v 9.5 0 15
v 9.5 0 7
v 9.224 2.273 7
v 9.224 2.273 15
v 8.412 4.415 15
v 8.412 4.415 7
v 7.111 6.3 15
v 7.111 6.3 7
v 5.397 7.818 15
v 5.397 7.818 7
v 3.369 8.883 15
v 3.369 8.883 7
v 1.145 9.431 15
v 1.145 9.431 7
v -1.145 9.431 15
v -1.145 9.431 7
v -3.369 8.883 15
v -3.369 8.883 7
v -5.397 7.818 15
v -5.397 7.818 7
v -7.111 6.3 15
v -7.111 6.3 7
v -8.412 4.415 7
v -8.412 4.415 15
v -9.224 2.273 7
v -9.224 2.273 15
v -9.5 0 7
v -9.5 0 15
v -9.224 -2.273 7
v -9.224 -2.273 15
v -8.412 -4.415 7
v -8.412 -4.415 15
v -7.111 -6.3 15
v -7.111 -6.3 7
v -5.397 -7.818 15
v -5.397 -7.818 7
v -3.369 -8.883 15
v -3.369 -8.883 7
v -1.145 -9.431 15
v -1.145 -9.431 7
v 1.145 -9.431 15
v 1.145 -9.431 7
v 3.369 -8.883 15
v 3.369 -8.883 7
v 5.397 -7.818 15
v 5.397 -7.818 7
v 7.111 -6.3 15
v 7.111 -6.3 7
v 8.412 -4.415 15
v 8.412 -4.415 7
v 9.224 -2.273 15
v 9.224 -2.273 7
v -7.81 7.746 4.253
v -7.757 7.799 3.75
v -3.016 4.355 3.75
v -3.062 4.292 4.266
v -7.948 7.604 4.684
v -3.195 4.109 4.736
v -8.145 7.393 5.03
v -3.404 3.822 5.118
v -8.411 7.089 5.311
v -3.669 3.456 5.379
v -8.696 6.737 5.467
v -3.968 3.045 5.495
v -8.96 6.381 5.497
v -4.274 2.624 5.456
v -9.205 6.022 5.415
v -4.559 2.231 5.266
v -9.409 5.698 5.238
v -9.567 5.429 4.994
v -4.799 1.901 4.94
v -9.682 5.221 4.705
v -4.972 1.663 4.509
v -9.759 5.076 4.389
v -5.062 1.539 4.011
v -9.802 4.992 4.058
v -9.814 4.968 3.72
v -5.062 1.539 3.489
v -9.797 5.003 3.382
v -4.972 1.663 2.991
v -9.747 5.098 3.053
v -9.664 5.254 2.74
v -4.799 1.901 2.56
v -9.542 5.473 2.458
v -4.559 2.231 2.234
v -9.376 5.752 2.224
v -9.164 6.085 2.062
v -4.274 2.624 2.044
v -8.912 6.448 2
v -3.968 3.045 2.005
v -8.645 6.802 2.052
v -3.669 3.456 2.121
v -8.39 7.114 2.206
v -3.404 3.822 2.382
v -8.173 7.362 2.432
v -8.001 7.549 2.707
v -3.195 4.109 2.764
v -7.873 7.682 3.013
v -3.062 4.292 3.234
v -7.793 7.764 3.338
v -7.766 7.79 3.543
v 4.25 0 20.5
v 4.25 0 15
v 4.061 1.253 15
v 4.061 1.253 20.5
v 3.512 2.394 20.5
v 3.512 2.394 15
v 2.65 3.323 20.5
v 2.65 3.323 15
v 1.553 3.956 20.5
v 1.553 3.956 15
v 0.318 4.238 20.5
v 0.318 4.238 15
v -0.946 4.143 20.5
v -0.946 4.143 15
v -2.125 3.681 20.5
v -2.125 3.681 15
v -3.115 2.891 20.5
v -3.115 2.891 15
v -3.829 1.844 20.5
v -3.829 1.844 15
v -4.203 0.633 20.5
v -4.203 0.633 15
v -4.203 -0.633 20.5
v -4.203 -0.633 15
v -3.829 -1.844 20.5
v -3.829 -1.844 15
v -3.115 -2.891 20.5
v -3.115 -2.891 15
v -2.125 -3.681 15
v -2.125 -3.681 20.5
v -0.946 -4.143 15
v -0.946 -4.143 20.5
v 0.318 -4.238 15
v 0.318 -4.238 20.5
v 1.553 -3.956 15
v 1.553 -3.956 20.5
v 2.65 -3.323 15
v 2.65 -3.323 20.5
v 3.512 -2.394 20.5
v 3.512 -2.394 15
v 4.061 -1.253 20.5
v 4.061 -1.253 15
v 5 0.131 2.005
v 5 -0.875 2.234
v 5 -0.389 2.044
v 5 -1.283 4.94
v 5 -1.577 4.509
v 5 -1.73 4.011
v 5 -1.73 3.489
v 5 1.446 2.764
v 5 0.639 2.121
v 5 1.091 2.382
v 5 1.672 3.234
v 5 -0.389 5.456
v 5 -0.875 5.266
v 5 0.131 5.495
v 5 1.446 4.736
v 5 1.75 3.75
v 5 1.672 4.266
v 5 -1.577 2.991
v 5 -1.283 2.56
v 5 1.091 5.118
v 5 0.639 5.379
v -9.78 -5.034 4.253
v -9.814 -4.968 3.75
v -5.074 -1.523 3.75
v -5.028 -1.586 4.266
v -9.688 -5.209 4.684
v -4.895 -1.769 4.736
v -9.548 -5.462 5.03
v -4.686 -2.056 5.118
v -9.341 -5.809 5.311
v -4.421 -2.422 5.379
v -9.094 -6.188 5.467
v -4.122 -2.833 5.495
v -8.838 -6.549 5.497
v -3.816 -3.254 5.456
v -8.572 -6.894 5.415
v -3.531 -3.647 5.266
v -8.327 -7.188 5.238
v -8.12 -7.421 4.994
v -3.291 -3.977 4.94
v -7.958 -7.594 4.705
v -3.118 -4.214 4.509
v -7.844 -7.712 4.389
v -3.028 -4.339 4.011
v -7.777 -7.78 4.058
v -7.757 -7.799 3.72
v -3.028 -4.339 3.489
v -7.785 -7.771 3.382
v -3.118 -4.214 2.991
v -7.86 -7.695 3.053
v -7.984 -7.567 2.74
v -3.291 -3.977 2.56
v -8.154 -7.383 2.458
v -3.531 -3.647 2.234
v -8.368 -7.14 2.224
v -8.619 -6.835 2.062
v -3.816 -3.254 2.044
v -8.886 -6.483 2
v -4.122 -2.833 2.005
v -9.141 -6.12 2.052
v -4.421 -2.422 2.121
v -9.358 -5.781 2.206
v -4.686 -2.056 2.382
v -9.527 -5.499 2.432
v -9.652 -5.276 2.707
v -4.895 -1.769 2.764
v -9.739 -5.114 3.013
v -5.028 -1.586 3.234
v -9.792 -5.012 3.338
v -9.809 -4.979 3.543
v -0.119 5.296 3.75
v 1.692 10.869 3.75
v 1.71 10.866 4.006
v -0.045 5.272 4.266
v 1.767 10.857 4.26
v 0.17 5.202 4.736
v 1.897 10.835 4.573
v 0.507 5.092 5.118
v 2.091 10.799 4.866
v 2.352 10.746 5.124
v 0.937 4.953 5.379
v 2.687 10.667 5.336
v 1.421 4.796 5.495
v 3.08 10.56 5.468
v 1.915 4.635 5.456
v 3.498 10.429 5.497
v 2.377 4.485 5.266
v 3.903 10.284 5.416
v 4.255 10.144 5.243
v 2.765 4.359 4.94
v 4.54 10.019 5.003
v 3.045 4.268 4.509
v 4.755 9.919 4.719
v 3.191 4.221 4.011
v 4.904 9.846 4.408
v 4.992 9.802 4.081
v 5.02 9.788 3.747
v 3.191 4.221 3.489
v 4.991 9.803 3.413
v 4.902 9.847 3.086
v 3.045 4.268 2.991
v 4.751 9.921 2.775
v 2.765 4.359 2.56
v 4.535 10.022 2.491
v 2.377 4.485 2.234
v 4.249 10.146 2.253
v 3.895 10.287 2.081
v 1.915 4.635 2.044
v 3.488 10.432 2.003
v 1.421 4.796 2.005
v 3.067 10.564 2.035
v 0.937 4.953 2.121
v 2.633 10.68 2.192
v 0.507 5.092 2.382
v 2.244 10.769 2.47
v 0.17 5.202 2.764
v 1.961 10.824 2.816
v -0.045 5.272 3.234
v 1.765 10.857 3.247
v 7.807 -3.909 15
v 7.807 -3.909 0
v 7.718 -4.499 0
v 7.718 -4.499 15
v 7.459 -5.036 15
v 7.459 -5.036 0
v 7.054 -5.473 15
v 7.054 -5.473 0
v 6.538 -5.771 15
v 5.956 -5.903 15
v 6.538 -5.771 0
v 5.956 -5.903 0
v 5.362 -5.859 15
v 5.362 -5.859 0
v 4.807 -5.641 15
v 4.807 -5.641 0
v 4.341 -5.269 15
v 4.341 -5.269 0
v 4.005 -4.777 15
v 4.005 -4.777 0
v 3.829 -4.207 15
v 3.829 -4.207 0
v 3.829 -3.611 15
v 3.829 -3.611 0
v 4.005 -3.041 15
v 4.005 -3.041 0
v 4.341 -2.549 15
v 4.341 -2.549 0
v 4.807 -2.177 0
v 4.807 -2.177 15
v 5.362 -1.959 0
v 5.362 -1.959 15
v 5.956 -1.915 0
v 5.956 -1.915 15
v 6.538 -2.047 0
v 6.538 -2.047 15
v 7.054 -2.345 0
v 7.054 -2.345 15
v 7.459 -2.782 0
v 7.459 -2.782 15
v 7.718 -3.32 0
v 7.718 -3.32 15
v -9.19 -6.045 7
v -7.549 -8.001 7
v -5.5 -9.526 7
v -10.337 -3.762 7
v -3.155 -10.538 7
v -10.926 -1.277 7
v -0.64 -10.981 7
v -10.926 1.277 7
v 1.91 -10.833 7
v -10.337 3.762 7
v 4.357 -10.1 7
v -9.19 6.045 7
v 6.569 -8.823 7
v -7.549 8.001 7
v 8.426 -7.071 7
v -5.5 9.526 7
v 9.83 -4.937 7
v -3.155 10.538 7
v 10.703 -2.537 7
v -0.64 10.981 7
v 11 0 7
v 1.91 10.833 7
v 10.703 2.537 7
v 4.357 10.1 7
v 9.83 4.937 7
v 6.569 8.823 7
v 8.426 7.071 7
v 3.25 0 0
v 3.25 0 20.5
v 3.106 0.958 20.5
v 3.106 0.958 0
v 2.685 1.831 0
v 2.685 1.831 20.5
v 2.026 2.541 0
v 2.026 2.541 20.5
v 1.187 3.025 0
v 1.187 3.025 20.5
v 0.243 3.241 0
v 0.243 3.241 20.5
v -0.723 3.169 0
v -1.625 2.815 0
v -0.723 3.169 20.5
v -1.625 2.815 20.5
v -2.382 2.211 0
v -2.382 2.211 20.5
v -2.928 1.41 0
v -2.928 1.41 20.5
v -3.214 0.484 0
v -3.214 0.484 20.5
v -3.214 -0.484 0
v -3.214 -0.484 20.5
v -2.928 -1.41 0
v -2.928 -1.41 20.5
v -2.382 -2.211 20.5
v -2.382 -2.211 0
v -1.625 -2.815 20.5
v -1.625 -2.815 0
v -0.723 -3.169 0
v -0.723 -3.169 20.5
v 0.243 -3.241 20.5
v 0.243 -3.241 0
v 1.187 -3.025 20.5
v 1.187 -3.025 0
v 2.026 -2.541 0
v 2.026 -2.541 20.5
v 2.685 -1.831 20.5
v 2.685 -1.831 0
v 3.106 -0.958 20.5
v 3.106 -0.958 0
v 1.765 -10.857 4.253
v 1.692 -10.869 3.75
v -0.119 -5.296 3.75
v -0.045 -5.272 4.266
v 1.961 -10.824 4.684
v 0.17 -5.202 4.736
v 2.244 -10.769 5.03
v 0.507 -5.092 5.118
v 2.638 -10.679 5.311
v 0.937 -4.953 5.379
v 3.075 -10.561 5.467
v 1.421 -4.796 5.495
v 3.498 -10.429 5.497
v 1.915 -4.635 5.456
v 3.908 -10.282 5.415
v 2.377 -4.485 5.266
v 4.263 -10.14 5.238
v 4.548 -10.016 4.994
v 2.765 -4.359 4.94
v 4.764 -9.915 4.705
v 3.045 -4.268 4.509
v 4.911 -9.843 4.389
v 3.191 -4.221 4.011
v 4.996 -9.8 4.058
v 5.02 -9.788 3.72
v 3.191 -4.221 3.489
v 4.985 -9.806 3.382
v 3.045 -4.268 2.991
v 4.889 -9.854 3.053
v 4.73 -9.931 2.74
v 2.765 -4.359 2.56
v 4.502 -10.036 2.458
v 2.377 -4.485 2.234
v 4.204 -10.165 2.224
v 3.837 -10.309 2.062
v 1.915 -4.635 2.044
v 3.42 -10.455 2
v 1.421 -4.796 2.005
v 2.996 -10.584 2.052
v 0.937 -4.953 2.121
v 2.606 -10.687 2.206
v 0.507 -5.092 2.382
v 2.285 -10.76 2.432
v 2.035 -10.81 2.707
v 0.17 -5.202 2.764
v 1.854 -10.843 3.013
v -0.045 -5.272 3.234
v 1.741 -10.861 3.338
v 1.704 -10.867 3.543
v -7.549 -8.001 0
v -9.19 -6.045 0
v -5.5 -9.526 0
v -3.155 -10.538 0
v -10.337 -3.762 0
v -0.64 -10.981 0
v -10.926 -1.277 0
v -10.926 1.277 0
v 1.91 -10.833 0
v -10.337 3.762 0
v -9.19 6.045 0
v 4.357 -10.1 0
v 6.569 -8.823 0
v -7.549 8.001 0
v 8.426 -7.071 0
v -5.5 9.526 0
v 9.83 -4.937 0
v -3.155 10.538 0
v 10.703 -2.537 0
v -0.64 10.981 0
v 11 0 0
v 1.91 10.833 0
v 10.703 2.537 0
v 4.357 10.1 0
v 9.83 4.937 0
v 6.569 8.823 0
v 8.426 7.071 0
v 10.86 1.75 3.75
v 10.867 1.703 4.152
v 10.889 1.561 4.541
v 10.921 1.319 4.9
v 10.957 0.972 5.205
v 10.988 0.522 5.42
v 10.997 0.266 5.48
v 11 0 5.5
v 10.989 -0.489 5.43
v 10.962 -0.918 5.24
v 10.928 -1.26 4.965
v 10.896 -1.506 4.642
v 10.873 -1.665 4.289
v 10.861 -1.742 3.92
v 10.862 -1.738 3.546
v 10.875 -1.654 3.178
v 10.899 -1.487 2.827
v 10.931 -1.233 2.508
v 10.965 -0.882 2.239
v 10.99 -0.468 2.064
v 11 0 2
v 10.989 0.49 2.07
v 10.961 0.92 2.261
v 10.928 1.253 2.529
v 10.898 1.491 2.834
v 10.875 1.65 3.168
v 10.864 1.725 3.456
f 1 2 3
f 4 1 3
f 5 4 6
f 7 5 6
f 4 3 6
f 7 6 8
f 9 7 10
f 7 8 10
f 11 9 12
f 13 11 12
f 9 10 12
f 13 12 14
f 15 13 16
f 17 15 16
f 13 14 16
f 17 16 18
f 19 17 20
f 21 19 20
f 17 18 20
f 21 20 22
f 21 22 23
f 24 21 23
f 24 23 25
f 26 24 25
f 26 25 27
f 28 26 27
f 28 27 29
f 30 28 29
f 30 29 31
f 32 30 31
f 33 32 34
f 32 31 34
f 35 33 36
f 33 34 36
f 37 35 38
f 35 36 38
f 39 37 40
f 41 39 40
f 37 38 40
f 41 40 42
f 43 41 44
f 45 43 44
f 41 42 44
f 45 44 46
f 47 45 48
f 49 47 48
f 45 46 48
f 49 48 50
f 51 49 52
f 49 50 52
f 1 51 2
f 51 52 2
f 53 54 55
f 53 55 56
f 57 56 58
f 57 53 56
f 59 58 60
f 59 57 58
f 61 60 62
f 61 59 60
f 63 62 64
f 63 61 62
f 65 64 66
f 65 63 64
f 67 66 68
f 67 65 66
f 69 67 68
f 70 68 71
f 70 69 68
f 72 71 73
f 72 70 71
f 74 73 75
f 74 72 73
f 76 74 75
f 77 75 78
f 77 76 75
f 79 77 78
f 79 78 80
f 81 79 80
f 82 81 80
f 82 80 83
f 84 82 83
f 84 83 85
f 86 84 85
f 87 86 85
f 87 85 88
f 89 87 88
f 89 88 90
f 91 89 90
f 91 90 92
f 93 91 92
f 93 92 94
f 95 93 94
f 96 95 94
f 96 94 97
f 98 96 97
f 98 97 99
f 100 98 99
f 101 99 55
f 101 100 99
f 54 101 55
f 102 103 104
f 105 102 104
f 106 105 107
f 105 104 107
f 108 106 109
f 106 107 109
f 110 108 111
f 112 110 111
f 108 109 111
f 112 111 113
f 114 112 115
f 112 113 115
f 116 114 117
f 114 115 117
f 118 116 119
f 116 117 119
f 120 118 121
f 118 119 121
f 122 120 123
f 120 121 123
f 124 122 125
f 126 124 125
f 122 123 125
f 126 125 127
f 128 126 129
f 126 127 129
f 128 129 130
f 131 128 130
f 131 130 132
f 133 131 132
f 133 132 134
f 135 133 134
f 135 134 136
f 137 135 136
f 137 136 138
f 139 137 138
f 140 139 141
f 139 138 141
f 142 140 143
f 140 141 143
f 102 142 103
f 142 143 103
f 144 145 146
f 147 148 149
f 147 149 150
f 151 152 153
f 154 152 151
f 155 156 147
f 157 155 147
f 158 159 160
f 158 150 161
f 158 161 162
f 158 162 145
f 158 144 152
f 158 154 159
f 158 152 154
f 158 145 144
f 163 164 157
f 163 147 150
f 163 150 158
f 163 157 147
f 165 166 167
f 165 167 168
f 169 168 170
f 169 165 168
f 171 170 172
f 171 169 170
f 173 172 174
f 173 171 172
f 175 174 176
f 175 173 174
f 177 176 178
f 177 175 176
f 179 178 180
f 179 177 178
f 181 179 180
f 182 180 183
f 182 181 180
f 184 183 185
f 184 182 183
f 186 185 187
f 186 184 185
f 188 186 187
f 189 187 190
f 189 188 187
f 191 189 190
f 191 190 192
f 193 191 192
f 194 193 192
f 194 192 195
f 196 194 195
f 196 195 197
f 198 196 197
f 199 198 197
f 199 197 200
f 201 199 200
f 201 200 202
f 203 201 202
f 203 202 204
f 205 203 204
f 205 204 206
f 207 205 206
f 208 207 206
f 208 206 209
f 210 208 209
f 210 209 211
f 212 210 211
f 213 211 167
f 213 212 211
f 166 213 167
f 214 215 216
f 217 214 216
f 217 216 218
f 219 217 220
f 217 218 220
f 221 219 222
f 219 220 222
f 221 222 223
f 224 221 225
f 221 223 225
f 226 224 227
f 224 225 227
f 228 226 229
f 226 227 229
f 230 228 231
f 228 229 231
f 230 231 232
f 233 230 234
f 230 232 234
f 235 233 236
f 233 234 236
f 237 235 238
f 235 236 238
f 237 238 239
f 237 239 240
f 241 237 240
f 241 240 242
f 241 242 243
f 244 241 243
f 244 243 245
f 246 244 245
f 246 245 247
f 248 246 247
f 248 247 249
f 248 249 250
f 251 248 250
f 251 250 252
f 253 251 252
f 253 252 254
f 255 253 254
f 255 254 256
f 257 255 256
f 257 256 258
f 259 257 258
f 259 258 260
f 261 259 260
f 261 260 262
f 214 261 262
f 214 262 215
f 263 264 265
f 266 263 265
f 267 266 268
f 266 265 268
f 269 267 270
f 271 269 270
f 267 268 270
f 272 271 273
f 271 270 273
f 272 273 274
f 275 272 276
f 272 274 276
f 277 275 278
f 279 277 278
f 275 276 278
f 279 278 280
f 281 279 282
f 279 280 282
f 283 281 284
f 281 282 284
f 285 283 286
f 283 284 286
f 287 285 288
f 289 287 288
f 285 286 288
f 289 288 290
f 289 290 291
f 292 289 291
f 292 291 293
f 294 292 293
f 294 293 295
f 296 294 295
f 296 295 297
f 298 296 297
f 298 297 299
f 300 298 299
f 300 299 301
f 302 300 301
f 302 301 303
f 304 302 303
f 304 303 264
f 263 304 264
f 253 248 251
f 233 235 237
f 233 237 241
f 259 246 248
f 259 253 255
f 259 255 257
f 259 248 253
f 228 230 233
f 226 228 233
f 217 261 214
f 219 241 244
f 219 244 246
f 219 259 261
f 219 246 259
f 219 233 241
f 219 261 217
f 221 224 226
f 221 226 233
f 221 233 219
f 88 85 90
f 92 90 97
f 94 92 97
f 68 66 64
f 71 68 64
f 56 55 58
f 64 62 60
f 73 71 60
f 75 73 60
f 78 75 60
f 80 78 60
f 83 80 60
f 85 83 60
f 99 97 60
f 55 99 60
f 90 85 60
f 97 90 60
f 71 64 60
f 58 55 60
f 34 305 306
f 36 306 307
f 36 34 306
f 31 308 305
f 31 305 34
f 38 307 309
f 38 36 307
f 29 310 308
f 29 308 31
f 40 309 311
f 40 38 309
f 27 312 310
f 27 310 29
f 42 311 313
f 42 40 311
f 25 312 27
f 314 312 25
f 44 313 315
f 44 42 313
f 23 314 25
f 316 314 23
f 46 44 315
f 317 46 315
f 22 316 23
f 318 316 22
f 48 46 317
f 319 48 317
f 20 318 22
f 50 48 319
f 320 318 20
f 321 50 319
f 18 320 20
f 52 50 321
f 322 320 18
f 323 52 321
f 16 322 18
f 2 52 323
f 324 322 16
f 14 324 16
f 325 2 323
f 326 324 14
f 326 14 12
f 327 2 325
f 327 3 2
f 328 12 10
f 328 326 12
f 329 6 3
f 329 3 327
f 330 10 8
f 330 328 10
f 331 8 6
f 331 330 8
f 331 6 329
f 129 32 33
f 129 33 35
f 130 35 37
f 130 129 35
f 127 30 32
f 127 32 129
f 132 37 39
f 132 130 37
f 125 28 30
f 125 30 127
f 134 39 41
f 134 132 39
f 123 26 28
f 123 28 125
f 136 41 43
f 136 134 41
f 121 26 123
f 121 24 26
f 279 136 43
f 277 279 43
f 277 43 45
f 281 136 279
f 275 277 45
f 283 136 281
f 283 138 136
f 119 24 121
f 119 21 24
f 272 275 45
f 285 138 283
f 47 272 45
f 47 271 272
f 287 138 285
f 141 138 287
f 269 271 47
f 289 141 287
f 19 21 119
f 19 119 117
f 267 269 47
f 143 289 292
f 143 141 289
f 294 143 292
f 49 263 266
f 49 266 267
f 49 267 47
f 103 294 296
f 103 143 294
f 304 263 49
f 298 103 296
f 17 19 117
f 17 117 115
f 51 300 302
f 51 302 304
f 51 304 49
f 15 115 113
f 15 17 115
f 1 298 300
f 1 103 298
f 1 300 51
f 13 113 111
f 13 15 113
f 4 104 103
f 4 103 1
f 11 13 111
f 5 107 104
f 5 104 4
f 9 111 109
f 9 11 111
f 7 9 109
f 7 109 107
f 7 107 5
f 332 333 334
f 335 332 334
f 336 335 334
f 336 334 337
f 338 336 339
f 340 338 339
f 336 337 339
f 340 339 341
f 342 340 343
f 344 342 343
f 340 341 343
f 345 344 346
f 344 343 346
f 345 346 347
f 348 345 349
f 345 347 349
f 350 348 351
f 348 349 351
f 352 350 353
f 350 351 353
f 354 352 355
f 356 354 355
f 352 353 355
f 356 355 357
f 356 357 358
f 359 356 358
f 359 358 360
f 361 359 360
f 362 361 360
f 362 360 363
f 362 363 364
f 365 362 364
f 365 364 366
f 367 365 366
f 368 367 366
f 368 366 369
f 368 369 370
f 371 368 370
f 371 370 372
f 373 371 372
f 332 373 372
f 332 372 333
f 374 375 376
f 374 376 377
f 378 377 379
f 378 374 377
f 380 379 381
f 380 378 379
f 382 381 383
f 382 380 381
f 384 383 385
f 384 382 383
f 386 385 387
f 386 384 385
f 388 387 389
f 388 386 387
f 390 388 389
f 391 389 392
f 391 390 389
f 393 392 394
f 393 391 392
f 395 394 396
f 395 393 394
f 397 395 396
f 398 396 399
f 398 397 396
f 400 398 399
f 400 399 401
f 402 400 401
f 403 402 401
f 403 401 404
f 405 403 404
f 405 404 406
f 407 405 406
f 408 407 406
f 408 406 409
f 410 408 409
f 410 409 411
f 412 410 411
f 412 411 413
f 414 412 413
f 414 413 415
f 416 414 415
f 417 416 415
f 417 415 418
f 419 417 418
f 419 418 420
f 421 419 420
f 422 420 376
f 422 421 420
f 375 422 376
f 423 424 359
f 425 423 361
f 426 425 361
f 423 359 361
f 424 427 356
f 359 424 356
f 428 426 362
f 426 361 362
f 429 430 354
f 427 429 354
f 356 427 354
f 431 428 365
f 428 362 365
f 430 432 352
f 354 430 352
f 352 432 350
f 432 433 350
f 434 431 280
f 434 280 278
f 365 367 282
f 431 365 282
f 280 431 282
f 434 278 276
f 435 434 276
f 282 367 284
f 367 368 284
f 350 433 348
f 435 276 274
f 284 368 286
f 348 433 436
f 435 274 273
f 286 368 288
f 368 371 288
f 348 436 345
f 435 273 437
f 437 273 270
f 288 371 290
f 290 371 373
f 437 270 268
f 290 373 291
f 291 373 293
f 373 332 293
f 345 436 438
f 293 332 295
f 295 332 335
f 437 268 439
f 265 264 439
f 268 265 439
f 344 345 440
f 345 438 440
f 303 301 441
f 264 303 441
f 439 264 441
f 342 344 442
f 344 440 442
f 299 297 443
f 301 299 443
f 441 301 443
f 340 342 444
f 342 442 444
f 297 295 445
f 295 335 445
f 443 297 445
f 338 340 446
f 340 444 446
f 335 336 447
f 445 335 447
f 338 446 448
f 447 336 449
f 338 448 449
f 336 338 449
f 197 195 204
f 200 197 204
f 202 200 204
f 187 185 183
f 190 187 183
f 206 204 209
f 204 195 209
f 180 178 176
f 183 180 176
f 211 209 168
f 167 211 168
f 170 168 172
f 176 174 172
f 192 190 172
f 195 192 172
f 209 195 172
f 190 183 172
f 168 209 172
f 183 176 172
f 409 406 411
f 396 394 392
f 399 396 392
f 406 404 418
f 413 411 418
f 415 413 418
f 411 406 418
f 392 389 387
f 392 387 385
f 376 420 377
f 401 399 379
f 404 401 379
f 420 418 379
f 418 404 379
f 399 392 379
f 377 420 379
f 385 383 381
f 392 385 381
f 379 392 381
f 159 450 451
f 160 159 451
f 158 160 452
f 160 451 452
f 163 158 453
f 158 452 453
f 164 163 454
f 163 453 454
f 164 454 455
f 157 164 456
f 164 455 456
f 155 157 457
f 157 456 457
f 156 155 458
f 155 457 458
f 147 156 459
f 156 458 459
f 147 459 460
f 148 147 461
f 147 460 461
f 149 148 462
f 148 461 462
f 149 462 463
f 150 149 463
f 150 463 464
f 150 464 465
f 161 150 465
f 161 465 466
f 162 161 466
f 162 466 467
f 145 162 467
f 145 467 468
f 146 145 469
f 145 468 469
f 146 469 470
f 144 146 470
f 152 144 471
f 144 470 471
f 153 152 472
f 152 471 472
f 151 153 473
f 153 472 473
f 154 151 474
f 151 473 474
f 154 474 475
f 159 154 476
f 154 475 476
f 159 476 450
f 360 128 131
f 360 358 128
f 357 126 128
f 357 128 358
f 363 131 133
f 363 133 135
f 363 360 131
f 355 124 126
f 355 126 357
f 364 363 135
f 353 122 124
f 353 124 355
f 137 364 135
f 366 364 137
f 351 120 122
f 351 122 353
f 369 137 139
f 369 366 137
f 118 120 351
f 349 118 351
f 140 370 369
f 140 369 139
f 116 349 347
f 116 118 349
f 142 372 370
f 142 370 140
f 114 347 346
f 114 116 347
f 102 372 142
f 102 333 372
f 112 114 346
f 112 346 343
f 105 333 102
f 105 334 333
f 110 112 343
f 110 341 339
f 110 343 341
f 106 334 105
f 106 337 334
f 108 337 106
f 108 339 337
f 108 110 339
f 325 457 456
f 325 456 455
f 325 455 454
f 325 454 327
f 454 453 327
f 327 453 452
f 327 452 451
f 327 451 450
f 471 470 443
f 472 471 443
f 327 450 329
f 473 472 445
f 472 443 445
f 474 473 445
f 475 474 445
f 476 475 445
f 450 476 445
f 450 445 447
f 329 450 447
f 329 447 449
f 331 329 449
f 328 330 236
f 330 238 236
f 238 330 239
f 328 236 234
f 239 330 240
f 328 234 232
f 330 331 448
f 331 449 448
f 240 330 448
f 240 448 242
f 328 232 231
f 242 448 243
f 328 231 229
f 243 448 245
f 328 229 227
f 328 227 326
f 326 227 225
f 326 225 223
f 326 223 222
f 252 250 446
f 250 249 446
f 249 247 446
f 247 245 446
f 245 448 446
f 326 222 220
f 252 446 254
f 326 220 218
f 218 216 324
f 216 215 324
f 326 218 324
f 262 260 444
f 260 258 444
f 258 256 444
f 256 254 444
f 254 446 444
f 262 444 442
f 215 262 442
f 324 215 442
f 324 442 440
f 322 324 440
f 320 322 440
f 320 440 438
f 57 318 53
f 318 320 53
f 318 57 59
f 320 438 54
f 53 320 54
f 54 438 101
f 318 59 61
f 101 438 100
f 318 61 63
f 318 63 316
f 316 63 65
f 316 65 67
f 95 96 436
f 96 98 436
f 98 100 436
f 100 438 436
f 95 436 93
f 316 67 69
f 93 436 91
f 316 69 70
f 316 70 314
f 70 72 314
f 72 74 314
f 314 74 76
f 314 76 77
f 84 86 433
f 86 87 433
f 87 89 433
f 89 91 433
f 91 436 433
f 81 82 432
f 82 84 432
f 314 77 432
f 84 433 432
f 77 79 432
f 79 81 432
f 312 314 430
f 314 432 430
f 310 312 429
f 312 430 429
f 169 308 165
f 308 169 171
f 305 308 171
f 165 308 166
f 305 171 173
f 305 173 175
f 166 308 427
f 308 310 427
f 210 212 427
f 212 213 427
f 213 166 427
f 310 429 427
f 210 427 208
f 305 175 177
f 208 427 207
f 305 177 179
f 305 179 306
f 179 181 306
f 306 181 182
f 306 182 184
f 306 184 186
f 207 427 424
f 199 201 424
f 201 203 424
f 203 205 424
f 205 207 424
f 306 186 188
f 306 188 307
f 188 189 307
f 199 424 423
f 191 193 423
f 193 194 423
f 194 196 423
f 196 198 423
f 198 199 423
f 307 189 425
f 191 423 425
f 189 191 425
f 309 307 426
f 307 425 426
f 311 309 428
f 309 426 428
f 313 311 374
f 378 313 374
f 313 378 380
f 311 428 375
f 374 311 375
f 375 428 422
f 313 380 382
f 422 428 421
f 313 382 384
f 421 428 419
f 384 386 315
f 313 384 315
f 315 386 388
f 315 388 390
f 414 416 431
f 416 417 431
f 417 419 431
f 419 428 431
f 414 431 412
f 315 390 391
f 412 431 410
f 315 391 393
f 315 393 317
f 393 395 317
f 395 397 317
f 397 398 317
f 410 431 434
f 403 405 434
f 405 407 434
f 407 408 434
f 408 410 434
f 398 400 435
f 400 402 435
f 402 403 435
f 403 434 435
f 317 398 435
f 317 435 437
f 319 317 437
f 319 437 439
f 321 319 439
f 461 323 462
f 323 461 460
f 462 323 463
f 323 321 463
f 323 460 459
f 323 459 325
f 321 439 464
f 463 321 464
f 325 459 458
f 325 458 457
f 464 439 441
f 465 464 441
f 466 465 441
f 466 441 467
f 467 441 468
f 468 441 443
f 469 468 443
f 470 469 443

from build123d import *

# Parameters (mm, degrees)
F0_R      = 11
F1_DEPTH  = 7
F2_R      = 9.5
F3_DEPTH  = 8
F4_R      = 4.25
F5_DEPTH  = 5.5
F6_R      = 3.25
F7_DEPTH  = 20.501
F10_R     = 1.75
F19_DEPTH = 6
F12_R     = 1.75
F20_DEPTH = 6
F14_R     = 1.75
F21_DEPTH = 6
F16_R     = 1.75
F22_DEPTH = 6
F18_R     = 1.75
F23_DEPTH = 6
F24_R     = 2
F25_DEPTH = 25


with BuildPart() as f1:
    # F0 (on Top) → F1 (new body)
    with BuildSketch(Plane.XY):
        Circle(F0_R)
    extrude(amount=F1_DEPTH)

    # F2 (on face) → F3 (join)
    with BuildSketch(Plane.XY.offset(7)):
        Circle(F2_R)
    extrude(amount=F3_DEPTH)

    # F4 (on face) → F5 (join)
    with BuildSketch(Plane.XY.offset(15)):
        Circle(F4_R)
    extrude(amount=F5_DEPTH)

    # F6 (on face) → F7 (cut, through all)
    with BuildSketch(Plane.XY.offset(20.5)):
        Circle(F6_R)
    extrude(amount=-F7_DEPTH, mode=Mode.SUBTRACT)

    # F10 (on line) → F19 (cut)
    with BuildSketch(Plane.YZ.offset(11)):
        with Locations((0, 3.75)):
            Circle(F10_R)
    extrude(amount=-F19_DEPTH, mode=Mode.SUBTRACT)

    # F12 (on line) → F20 (cut)
    with BuildSketch(Plane(origin=(3.3991869381, -10.4616216792, 0), x_dir=(-0.9510565163, -0.3090169944, 0), z_dir=(-0.3090169944, 0.9510565163, 0))):
        with Locations((0, 3.75)):
            Circle(F12_R)
    extrude(amount=F20_DEPTH, mode=Mode.SUBTRACT)

    # F14 (on face) → F21 (cut)
    with BuildSketch(Plane(origin=(-8.8991869381, -6.4656377752, 0), x_dir=(-0.5877852523, 0.8090169944, 0), z_dir=(0.8090169944, 0.5877852523, 0))):
        with Locations((0, 3.75)):
            Circle(F14_R)
    extrude(amount=F21_DEPTH, mode=Mode.SUBTRACT)

    # F16 (on face) → F22 (cut)
    with BuildSketch(Plane(origin=(-8.8991869381, 6.4656377752, 0), x_dir=(0.5877852523, 0.8090169944, 0), z_dir=(0.8090169944, -0.5877852523, 0))):
        with Locations((0, 3.75)):
            Circle(F16_R)
    extrude(amount=F22_DEPTH, mode=Mode.SUBTRACT)

    # F18 (on line) → F23 (cut)
    with BuildSketch(Plane(origin=(3.3991869381, 10.4616216792, 0), x_dir=(-0.9510565163, 0.3090169944, 0), z_dir=(0.3090169944, 0.9510565163, 0))):
        with Locations((0, 3.75)):
            Circle(F18_R)
    extrude(amount=-F23_DEPTH, mode=Mode.SUBTRACT)

    # F24 (on face) → F25 (cut)
    with BuildSketch(Plane(origin=(0, 0, 0), x_dir=(1, 0, 0), z_dir=(0, 0, -1))):
        with Locations((5.8068181818, 3.9090743921)):
            Circle(F24_R)
    extrude(amount=-F25_DEPTH, mode=Mode.SUBTRACT)


solid = f1.part
